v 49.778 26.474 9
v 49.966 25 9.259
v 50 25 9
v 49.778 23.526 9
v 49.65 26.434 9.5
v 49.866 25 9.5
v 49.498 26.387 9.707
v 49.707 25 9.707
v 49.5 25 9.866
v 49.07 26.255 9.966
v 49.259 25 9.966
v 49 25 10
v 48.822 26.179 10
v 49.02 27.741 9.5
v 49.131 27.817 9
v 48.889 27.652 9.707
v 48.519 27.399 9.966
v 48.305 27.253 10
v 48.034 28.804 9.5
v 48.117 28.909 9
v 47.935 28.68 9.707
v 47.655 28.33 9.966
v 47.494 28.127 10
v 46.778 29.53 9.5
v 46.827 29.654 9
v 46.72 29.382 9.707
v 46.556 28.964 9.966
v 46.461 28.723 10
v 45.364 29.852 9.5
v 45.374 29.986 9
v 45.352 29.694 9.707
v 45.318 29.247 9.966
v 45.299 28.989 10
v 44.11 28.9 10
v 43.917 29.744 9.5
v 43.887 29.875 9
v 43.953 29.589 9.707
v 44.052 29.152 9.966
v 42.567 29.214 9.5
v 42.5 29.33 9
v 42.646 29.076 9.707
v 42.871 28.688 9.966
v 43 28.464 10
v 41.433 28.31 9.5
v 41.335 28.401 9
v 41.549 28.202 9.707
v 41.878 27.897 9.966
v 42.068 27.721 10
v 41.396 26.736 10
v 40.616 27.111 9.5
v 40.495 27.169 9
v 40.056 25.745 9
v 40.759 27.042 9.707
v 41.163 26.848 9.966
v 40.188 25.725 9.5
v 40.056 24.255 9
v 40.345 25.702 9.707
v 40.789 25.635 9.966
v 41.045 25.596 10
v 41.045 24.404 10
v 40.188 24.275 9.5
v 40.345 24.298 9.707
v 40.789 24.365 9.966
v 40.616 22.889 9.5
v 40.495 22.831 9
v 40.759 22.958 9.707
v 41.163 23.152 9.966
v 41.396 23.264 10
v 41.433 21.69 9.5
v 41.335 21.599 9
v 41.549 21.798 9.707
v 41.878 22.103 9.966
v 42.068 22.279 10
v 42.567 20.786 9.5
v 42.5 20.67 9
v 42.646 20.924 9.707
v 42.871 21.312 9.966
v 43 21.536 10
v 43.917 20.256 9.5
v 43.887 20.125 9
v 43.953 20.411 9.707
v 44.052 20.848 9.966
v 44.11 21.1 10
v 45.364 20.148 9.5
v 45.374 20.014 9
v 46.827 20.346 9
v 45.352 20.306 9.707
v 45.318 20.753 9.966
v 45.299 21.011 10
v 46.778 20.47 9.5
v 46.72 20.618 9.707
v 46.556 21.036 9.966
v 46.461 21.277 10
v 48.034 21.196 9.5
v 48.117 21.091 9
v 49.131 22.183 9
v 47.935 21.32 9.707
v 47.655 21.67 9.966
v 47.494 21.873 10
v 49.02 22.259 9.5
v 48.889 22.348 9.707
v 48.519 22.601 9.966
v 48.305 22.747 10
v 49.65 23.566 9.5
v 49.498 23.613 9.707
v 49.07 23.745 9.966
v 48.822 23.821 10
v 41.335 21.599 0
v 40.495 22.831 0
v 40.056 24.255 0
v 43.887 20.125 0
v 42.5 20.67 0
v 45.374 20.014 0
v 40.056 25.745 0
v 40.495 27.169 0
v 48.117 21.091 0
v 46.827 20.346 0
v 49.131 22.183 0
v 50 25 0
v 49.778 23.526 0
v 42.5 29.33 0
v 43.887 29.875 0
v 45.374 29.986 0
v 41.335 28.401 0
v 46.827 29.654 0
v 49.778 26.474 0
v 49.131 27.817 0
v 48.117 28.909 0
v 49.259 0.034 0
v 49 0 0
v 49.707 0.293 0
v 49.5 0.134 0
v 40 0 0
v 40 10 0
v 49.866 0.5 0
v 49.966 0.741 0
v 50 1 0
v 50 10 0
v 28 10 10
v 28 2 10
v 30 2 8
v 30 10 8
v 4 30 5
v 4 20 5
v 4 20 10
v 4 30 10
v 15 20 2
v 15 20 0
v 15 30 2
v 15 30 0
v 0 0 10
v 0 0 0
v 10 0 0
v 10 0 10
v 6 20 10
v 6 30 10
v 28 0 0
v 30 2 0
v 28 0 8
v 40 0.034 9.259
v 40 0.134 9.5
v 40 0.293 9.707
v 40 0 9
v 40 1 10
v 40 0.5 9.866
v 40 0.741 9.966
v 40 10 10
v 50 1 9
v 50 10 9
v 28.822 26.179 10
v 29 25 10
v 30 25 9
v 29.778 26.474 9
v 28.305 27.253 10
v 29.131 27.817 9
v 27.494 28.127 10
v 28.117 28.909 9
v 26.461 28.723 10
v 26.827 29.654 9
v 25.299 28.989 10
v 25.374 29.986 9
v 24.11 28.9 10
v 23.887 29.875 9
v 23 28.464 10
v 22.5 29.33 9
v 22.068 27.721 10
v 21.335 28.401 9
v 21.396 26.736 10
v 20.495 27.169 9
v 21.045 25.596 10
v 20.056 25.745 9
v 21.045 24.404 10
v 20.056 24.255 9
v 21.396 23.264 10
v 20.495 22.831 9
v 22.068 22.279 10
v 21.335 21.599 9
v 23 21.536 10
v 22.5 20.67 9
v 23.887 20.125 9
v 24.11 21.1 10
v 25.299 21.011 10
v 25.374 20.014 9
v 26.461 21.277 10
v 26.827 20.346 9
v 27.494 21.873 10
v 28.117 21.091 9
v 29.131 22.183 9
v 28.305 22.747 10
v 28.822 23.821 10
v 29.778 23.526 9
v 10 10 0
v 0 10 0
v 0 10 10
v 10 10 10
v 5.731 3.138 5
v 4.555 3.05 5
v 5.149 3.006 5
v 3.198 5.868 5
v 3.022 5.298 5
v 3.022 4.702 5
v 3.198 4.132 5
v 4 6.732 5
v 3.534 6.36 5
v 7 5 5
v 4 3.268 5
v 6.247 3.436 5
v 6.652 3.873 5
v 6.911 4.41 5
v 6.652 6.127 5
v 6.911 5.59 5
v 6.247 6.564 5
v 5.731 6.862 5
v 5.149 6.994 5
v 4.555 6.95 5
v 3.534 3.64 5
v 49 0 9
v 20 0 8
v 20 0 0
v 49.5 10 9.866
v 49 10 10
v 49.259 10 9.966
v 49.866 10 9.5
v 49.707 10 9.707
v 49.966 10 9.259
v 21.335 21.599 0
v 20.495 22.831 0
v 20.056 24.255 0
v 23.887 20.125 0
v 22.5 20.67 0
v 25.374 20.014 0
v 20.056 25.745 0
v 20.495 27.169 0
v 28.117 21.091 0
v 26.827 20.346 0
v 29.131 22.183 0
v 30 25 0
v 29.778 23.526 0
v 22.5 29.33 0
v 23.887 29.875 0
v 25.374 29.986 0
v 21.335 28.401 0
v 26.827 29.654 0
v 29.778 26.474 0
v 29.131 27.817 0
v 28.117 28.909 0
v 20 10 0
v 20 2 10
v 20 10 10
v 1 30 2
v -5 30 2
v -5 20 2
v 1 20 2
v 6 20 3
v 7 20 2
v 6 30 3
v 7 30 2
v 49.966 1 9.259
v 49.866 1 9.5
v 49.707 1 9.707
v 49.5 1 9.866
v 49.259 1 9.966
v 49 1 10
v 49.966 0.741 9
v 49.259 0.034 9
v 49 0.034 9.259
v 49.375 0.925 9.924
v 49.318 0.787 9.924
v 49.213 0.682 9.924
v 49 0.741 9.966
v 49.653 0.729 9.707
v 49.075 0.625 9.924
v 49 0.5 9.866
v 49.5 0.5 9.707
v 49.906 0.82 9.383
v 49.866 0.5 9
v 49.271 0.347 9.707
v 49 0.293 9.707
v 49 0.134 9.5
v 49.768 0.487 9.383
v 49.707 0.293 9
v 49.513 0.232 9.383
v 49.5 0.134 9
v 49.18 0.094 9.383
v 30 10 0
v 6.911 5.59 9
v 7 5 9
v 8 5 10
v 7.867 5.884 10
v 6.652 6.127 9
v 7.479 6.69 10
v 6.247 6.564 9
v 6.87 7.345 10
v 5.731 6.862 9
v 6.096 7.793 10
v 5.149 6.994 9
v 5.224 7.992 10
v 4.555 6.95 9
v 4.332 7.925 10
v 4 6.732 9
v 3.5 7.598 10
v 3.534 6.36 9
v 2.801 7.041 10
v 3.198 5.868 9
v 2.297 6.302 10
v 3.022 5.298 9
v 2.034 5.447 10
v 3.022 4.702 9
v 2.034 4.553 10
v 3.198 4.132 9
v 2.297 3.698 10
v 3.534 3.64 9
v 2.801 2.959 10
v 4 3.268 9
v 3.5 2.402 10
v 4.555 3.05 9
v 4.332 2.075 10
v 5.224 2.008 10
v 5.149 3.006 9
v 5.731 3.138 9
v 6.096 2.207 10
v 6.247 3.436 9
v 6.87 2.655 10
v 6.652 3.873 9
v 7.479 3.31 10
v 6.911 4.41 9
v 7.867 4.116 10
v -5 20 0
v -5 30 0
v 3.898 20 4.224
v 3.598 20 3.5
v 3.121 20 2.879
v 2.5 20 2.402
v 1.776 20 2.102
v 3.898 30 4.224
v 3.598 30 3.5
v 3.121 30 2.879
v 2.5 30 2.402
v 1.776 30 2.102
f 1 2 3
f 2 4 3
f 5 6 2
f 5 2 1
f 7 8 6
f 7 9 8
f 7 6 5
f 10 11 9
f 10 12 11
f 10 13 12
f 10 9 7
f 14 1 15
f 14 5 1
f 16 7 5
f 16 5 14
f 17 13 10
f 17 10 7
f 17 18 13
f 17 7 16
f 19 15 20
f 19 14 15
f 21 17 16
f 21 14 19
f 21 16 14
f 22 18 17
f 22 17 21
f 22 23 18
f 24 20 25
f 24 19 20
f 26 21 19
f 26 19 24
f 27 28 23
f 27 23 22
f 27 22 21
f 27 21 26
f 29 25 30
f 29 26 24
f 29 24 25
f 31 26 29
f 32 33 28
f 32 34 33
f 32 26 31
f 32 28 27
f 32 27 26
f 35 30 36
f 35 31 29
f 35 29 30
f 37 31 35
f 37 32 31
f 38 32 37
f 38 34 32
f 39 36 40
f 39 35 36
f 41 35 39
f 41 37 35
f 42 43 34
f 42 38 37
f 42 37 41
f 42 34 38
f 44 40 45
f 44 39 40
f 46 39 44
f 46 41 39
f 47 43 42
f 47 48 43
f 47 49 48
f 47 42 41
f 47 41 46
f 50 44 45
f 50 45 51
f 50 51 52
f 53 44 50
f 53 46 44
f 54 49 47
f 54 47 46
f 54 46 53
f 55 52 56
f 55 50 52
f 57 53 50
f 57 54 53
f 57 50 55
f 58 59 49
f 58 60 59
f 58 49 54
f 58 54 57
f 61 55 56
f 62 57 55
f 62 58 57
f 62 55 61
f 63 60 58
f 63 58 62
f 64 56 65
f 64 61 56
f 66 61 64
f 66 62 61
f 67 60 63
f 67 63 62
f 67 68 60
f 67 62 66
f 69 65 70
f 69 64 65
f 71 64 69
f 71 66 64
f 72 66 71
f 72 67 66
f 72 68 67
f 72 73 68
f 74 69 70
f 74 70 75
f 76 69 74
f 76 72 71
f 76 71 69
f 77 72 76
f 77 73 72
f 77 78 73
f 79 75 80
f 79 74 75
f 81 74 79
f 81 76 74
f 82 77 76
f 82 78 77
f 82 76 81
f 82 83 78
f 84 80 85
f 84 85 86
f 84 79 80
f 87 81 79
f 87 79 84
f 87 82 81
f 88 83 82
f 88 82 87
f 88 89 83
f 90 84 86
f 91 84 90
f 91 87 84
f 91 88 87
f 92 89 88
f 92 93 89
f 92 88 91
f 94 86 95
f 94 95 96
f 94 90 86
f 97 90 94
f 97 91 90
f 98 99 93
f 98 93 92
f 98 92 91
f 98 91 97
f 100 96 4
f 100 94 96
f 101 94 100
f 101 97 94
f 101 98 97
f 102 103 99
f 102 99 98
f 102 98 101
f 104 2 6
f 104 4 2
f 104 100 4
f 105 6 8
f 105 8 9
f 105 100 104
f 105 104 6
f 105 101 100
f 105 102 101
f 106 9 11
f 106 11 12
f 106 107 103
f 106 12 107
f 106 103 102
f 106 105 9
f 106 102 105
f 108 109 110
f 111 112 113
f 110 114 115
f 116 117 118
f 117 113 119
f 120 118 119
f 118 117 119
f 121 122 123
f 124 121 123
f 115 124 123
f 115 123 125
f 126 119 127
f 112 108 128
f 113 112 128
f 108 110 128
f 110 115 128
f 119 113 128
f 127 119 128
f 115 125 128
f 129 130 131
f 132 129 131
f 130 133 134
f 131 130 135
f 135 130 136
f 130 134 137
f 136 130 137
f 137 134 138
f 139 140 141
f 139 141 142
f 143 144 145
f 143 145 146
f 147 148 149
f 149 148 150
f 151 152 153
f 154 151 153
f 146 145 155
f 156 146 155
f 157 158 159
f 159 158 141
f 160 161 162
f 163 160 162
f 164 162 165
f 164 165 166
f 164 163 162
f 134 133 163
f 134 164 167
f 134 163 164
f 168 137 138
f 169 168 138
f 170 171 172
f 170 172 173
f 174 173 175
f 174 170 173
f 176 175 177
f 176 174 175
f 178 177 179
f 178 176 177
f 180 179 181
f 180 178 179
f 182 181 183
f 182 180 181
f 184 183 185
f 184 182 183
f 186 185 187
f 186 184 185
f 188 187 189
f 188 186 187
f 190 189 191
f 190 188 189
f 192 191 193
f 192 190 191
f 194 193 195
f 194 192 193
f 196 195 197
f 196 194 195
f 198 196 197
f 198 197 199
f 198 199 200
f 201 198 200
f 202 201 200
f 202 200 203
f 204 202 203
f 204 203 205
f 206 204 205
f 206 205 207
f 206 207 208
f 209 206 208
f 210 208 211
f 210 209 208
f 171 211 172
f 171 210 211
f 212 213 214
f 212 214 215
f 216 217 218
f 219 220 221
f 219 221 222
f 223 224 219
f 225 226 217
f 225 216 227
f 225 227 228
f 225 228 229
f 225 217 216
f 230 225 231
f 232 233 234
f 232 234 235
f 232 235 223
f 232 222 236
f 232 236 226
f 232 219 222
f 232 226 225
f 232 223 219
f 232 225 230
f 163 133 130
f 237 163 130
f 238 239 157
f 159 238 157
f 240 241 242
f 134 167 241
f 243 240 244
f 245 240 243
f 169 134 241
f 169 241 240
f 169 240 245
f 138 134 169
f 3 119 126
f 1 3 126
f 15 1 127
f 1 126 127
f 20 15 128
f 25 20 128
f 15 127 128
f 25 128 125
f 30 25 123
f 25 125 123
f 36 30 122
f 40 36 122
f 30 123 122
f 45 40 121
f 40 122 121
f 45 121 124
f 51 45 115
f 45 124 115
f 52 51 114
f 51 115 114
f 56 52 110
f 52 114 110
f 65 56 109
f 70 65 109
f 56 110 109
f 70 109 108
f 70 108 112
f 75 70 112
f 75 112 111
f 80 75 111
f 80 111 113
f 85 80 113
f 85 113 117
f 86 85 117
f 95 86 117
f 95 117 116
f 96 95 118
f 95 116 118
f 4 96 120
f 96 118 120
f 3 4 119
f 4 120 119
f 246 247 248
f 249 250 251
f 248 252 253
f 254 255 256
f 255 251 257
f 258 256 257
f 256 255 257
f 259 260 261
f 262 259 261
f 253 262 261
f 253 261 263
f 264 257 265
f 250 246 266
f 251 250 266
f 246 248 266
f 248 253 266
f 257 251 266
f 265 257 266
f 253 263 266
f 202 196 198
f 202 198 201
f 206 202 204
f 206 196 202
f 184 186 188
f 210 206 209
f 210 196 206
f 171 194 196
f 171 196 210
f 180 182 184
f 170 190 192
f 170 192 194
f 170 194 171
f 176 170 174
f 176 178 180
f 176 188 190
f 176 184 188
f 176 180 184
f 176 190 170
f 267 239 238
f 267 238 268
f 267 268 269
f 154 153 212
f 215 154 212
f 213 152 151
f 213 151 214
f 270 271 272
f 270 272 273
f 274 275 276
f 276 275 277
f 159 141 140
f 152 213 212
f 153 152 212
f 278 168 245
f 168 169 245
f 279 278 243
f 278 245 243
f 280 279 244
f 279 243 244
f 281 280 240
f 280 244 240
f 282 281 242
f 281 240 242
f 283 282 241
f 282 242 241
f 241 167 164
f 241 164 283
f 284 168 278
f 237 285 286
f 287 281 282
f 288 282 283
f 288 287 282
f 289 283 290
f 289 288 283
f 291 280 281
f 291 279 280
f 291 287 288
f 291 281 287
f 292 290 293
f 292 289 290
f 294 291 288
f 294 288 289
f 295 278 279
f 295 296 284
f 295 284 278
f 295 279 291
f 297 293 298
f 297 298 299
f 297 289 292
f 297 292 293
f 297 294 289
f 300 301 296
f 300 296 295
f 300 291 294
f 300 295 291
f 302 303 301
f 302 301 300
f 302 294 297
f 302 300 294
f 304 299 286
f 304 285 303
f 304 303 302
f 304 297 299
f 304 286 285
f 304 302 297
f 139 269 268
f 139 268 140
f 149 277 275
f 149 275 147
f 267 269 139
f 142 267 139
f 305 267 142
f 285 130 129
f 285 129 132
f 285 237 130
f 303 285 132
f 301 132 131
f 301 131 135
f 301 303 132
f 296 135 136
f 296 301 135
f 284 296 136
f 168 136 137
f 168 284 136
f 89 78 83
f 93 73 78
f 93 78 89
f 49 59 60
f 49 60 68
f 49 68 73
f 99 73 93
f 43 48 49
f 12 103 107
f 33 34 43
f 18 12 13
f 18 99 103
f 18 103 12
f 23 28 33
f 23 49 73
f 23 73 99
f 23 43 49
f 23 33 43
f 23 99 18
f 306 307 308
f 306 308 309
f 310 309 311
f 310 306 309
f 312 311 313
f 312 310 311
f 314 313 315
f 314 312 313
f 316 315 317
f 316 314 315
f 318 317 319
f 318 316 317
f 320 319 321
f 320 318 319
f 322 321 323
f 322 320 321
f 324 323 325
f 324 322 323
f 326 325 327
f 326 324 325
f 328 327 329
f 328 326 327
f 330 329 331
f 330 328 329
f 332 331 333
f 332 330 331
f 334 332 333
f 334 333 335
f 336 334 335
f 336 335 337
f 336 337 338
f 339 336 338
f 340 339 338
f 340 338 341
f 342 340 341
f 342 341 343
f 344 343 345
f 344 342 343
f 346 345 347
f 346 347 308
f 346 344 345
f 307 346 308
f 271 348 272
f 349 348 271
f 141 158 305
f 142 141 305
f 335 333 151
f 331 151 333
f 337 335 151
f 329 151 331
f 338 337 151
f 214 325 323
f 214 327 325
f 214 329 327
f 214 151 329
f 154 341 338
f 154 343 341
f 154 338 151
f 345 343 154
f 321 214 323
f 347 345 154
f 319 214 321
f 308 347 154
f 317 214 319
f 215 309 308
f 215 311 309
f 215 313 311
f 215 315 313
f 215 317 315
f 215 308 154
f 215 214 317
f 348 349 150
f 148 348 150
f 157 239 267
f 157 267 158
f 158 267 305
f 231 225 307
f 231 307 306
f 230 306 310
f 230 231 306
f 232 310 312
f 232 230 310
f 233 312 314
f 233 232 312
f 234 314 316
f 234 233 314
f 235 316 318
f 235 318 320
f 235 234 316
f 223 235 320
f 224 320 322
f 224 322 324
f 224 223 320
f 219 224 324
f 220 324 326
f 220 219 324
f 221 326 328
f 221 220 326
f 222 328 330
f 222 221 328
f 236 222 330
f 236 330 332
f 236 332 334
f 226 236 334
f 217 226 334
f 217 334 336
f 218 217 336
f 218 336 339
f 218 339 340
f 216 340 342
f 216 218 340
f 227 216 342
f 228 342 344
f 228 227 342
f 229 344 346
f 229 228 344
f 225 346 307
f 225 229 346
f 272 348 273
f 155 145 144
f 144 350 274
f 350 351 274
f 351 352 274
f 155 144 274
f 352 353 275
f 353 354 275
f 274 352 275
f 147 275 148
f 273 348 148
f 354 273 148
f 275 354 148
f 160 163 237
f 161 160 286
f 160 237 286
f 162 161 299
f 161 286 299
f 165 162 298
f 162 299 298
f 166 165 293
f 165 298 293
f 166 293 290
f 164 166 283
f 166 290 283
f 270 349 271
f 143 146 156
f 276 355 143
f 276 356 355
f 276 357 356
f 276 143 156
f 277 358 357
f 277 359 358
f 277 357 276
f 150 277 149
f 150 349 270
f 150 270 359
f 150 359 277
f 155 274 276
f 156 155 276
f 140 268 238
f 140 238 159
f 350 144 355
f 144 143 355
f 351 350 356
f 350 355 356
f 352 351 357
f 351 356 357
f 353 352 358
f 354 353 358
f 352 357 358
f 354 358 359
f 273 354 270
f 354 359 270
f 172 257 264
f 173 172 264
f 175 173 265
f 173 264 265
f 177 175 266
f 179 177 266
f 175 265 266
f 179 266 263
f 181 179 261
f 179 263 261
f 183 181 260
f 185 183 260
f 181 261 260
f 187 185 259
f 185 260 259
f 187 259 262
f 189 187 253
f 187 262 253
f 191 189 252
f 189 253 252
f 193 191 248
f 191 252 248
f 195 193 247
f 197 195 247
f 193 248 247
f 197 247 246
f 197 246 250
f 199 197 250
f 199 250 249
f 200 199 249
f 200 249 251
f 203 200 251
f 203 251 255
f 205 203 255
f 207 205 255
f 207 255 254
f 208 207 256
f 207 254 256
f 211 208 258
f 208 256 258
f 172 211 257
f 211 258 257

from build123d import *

# Parameters (mm, degrees)
BOX002_W          = 10
BOX002_H          = 10
BOX002_DEPTH      = 10
FILLET_R          = 1
BOX001_W          = 10
BOX001_H          = 10
BOX001_DEPTH      = 10
CHAMFER_SIZE      = 2
CYLINDER_R        = 2
CYLINDER_DEPTH    = 5
BOX_W             = 10
BOX_H             = 10
BOX_DEPTH         = 10
CHAMFER001_SIZE   = 1
CYLINDER001_R     = 5
CYLINDER001_DEPTH = 10
FILLET001_R       = 1
CYLINDER002_R     = 5
CYLINDER002_DEPTH = 10
CHAMFER002_SIZE   = 1
BOX003_W          = 20
BOX003_H          = 10
BOX003_DEPTH      = 2
BOX004_W          = 2
BOX004_H          = 10
BOX004_DEPTH      = 10
CHAMFER003_SIZE   = 1
FILLET002_R       = 3


with BuildPart() as fillet_body:
    # Box002 → Box002 (new body)
    with BuildSketch(Plane(origin=(40, 0, 0), x_dir=(1, 0, 0), z_dir=(0, 0, 1))):
        with Locations((5, 5)):
            Rectangle(BOX002_W, BOX002_H)
    extrude(amount=BOX002_DEPTH)

    # Fillet
    fillet_edges = [fillet_body.edges().sort_by_distance(p)[0] for p in [
        (50, 0, 5),
        (50, 5, 10),
        (45, 0, 10),
    ]]
    fillet(fillet_edges, radius=FILLET_R)


with BuildPart() as chamfer_body:
    # Box001 → Box001 (new body)
    with BuildSketch(Plane(origin=(20, 0, 0), x_dir=(1, 0, 0), z_dir=(0, 0, 1))):
        with Locations((5, 5)):
            Rectangle(BOX001_W, BOX001_H)
    extrude(amount=BOX001_DEPTH)

    # Chamfer
    chamfer_edges = [chamfer_body.edges().sort_by_distance(p)[0] for p in [
        (30, 0, 5),
        (30, 5, 10),
        (25, 0, 10),
    ]]
    chamfer(chamfer_edges, length=CHAMFER_SIZE)


with BuildPart() as cilindre:
    # Cylinder → Cylinder (new body)
    with BuildSketch(Plane(origin=(5, 5, 5), x_dir=(1, 0, 0), z_dir=(0, 0, 1))):
        Circle(CYLINDER_R)
    extrude(amount=CYLINDER_DEPTH)


with BuildPart() as chamfer001:
    # Box → Box (new body)
    with BuildSketch(Plane.XY):
        with Locations((5, 5)):
            Rectangle(BOX_W, BOX_H)
    extrude(amount=BOX_DEPTH)

    # Cut: cut Cilindre
    add(cilindre.part, mode=Mode.SUBTRACT)

    # Chamfer001
    chamfer001_edges = [chamfer001.edges().sort_by_distance(p)[0] for p in [
        (3, 5, 10),
    ]]
    chamfer(chamfer001_edges, length=CHAMFER001_SIZE)


with BuildPart() as fillet001:
    # Cylinder001 → Cylinder001 (new body)
    with BuildSketch(Plane(origin=(45, 25, 0), x_dir=(1, 0, 0), z_dir=(0, 0, 1))):
        Circle(CYLINDER001_R)
    extrude(amount=CYLINDER001_DEPTH)

    # Fillet001
    fillet001_edges = [fillet001.edges().sort_by_distance(p)[0] for p in [
        (40, 25, 10),
    ]]
    fillet(fillet001_edges, radius=FILLET001_R)


with BuildPart() as chamfer002:
    # Cylinder002 → Cylinder002 (new body)
    with BuildSketch(Plane(origin=(25, 25, 0), x_dir=(1, 0, 0), z_dir=(0, 0, 1))):
        Circle(CYLINDER002_R)
    extrude(amount=CYLINDER002_DEPTH)

    # Chamfer002
    chamfer002_edges = [chamfer002.edges().sort_by_distance(p)[0] for p in [
        (20, 25, 10),
    ]]
    chamfer(chamfer002_edges, length=CHAMFER002_SIZE)


with BuildPart() as cub001:
    # Box003 → Box003 (new body)
    with BuildSketch(Plane(origin=(-5, 20, 0), x_dir=(1, 0, 0), z_dir=(0, 0, 1))):
        with Locations((10, 5)):
            Rectangle(BOX003_W, BOX003_H)
    extrude(amount=BOX003_DEPTH)


with BuildPart() as fillet002:
    # Box004 → Box004 (new body)
    with BuildSketch(Plane(origin=(4, 20, 0), x_dir=(1, 0, 0), z_dir=(0, 0, 1))):
        with Locations((1, 5)):
            Rectangle(BOX004_W, BOX004_H)
    extrude(amount=BOX004_DEPTH)

    # Fusion: union Cub001
    add(cub001.part)

    # Chamfer003
    chamfer003_edges = [fillet002.edges().sort_by_distance(p)[0] for p in [
        (6, 25, 2),
    ]]
    chamfer(chamfer003_edges, length=CHAMFER003_SIZE)

    # Fillet002
    fillet002_edges = [fillet002.edges().sort_by_distance(p)[0] for p in [
        (4, 25, 2),
    ]]
    fillet(fillet002_edges, radius=FILLET002_R)


solid = Compound([fillet_body.part, chamfer_body.part, chamfer001.part, fillet001.part, chamfer002.part, fillet002.part])
